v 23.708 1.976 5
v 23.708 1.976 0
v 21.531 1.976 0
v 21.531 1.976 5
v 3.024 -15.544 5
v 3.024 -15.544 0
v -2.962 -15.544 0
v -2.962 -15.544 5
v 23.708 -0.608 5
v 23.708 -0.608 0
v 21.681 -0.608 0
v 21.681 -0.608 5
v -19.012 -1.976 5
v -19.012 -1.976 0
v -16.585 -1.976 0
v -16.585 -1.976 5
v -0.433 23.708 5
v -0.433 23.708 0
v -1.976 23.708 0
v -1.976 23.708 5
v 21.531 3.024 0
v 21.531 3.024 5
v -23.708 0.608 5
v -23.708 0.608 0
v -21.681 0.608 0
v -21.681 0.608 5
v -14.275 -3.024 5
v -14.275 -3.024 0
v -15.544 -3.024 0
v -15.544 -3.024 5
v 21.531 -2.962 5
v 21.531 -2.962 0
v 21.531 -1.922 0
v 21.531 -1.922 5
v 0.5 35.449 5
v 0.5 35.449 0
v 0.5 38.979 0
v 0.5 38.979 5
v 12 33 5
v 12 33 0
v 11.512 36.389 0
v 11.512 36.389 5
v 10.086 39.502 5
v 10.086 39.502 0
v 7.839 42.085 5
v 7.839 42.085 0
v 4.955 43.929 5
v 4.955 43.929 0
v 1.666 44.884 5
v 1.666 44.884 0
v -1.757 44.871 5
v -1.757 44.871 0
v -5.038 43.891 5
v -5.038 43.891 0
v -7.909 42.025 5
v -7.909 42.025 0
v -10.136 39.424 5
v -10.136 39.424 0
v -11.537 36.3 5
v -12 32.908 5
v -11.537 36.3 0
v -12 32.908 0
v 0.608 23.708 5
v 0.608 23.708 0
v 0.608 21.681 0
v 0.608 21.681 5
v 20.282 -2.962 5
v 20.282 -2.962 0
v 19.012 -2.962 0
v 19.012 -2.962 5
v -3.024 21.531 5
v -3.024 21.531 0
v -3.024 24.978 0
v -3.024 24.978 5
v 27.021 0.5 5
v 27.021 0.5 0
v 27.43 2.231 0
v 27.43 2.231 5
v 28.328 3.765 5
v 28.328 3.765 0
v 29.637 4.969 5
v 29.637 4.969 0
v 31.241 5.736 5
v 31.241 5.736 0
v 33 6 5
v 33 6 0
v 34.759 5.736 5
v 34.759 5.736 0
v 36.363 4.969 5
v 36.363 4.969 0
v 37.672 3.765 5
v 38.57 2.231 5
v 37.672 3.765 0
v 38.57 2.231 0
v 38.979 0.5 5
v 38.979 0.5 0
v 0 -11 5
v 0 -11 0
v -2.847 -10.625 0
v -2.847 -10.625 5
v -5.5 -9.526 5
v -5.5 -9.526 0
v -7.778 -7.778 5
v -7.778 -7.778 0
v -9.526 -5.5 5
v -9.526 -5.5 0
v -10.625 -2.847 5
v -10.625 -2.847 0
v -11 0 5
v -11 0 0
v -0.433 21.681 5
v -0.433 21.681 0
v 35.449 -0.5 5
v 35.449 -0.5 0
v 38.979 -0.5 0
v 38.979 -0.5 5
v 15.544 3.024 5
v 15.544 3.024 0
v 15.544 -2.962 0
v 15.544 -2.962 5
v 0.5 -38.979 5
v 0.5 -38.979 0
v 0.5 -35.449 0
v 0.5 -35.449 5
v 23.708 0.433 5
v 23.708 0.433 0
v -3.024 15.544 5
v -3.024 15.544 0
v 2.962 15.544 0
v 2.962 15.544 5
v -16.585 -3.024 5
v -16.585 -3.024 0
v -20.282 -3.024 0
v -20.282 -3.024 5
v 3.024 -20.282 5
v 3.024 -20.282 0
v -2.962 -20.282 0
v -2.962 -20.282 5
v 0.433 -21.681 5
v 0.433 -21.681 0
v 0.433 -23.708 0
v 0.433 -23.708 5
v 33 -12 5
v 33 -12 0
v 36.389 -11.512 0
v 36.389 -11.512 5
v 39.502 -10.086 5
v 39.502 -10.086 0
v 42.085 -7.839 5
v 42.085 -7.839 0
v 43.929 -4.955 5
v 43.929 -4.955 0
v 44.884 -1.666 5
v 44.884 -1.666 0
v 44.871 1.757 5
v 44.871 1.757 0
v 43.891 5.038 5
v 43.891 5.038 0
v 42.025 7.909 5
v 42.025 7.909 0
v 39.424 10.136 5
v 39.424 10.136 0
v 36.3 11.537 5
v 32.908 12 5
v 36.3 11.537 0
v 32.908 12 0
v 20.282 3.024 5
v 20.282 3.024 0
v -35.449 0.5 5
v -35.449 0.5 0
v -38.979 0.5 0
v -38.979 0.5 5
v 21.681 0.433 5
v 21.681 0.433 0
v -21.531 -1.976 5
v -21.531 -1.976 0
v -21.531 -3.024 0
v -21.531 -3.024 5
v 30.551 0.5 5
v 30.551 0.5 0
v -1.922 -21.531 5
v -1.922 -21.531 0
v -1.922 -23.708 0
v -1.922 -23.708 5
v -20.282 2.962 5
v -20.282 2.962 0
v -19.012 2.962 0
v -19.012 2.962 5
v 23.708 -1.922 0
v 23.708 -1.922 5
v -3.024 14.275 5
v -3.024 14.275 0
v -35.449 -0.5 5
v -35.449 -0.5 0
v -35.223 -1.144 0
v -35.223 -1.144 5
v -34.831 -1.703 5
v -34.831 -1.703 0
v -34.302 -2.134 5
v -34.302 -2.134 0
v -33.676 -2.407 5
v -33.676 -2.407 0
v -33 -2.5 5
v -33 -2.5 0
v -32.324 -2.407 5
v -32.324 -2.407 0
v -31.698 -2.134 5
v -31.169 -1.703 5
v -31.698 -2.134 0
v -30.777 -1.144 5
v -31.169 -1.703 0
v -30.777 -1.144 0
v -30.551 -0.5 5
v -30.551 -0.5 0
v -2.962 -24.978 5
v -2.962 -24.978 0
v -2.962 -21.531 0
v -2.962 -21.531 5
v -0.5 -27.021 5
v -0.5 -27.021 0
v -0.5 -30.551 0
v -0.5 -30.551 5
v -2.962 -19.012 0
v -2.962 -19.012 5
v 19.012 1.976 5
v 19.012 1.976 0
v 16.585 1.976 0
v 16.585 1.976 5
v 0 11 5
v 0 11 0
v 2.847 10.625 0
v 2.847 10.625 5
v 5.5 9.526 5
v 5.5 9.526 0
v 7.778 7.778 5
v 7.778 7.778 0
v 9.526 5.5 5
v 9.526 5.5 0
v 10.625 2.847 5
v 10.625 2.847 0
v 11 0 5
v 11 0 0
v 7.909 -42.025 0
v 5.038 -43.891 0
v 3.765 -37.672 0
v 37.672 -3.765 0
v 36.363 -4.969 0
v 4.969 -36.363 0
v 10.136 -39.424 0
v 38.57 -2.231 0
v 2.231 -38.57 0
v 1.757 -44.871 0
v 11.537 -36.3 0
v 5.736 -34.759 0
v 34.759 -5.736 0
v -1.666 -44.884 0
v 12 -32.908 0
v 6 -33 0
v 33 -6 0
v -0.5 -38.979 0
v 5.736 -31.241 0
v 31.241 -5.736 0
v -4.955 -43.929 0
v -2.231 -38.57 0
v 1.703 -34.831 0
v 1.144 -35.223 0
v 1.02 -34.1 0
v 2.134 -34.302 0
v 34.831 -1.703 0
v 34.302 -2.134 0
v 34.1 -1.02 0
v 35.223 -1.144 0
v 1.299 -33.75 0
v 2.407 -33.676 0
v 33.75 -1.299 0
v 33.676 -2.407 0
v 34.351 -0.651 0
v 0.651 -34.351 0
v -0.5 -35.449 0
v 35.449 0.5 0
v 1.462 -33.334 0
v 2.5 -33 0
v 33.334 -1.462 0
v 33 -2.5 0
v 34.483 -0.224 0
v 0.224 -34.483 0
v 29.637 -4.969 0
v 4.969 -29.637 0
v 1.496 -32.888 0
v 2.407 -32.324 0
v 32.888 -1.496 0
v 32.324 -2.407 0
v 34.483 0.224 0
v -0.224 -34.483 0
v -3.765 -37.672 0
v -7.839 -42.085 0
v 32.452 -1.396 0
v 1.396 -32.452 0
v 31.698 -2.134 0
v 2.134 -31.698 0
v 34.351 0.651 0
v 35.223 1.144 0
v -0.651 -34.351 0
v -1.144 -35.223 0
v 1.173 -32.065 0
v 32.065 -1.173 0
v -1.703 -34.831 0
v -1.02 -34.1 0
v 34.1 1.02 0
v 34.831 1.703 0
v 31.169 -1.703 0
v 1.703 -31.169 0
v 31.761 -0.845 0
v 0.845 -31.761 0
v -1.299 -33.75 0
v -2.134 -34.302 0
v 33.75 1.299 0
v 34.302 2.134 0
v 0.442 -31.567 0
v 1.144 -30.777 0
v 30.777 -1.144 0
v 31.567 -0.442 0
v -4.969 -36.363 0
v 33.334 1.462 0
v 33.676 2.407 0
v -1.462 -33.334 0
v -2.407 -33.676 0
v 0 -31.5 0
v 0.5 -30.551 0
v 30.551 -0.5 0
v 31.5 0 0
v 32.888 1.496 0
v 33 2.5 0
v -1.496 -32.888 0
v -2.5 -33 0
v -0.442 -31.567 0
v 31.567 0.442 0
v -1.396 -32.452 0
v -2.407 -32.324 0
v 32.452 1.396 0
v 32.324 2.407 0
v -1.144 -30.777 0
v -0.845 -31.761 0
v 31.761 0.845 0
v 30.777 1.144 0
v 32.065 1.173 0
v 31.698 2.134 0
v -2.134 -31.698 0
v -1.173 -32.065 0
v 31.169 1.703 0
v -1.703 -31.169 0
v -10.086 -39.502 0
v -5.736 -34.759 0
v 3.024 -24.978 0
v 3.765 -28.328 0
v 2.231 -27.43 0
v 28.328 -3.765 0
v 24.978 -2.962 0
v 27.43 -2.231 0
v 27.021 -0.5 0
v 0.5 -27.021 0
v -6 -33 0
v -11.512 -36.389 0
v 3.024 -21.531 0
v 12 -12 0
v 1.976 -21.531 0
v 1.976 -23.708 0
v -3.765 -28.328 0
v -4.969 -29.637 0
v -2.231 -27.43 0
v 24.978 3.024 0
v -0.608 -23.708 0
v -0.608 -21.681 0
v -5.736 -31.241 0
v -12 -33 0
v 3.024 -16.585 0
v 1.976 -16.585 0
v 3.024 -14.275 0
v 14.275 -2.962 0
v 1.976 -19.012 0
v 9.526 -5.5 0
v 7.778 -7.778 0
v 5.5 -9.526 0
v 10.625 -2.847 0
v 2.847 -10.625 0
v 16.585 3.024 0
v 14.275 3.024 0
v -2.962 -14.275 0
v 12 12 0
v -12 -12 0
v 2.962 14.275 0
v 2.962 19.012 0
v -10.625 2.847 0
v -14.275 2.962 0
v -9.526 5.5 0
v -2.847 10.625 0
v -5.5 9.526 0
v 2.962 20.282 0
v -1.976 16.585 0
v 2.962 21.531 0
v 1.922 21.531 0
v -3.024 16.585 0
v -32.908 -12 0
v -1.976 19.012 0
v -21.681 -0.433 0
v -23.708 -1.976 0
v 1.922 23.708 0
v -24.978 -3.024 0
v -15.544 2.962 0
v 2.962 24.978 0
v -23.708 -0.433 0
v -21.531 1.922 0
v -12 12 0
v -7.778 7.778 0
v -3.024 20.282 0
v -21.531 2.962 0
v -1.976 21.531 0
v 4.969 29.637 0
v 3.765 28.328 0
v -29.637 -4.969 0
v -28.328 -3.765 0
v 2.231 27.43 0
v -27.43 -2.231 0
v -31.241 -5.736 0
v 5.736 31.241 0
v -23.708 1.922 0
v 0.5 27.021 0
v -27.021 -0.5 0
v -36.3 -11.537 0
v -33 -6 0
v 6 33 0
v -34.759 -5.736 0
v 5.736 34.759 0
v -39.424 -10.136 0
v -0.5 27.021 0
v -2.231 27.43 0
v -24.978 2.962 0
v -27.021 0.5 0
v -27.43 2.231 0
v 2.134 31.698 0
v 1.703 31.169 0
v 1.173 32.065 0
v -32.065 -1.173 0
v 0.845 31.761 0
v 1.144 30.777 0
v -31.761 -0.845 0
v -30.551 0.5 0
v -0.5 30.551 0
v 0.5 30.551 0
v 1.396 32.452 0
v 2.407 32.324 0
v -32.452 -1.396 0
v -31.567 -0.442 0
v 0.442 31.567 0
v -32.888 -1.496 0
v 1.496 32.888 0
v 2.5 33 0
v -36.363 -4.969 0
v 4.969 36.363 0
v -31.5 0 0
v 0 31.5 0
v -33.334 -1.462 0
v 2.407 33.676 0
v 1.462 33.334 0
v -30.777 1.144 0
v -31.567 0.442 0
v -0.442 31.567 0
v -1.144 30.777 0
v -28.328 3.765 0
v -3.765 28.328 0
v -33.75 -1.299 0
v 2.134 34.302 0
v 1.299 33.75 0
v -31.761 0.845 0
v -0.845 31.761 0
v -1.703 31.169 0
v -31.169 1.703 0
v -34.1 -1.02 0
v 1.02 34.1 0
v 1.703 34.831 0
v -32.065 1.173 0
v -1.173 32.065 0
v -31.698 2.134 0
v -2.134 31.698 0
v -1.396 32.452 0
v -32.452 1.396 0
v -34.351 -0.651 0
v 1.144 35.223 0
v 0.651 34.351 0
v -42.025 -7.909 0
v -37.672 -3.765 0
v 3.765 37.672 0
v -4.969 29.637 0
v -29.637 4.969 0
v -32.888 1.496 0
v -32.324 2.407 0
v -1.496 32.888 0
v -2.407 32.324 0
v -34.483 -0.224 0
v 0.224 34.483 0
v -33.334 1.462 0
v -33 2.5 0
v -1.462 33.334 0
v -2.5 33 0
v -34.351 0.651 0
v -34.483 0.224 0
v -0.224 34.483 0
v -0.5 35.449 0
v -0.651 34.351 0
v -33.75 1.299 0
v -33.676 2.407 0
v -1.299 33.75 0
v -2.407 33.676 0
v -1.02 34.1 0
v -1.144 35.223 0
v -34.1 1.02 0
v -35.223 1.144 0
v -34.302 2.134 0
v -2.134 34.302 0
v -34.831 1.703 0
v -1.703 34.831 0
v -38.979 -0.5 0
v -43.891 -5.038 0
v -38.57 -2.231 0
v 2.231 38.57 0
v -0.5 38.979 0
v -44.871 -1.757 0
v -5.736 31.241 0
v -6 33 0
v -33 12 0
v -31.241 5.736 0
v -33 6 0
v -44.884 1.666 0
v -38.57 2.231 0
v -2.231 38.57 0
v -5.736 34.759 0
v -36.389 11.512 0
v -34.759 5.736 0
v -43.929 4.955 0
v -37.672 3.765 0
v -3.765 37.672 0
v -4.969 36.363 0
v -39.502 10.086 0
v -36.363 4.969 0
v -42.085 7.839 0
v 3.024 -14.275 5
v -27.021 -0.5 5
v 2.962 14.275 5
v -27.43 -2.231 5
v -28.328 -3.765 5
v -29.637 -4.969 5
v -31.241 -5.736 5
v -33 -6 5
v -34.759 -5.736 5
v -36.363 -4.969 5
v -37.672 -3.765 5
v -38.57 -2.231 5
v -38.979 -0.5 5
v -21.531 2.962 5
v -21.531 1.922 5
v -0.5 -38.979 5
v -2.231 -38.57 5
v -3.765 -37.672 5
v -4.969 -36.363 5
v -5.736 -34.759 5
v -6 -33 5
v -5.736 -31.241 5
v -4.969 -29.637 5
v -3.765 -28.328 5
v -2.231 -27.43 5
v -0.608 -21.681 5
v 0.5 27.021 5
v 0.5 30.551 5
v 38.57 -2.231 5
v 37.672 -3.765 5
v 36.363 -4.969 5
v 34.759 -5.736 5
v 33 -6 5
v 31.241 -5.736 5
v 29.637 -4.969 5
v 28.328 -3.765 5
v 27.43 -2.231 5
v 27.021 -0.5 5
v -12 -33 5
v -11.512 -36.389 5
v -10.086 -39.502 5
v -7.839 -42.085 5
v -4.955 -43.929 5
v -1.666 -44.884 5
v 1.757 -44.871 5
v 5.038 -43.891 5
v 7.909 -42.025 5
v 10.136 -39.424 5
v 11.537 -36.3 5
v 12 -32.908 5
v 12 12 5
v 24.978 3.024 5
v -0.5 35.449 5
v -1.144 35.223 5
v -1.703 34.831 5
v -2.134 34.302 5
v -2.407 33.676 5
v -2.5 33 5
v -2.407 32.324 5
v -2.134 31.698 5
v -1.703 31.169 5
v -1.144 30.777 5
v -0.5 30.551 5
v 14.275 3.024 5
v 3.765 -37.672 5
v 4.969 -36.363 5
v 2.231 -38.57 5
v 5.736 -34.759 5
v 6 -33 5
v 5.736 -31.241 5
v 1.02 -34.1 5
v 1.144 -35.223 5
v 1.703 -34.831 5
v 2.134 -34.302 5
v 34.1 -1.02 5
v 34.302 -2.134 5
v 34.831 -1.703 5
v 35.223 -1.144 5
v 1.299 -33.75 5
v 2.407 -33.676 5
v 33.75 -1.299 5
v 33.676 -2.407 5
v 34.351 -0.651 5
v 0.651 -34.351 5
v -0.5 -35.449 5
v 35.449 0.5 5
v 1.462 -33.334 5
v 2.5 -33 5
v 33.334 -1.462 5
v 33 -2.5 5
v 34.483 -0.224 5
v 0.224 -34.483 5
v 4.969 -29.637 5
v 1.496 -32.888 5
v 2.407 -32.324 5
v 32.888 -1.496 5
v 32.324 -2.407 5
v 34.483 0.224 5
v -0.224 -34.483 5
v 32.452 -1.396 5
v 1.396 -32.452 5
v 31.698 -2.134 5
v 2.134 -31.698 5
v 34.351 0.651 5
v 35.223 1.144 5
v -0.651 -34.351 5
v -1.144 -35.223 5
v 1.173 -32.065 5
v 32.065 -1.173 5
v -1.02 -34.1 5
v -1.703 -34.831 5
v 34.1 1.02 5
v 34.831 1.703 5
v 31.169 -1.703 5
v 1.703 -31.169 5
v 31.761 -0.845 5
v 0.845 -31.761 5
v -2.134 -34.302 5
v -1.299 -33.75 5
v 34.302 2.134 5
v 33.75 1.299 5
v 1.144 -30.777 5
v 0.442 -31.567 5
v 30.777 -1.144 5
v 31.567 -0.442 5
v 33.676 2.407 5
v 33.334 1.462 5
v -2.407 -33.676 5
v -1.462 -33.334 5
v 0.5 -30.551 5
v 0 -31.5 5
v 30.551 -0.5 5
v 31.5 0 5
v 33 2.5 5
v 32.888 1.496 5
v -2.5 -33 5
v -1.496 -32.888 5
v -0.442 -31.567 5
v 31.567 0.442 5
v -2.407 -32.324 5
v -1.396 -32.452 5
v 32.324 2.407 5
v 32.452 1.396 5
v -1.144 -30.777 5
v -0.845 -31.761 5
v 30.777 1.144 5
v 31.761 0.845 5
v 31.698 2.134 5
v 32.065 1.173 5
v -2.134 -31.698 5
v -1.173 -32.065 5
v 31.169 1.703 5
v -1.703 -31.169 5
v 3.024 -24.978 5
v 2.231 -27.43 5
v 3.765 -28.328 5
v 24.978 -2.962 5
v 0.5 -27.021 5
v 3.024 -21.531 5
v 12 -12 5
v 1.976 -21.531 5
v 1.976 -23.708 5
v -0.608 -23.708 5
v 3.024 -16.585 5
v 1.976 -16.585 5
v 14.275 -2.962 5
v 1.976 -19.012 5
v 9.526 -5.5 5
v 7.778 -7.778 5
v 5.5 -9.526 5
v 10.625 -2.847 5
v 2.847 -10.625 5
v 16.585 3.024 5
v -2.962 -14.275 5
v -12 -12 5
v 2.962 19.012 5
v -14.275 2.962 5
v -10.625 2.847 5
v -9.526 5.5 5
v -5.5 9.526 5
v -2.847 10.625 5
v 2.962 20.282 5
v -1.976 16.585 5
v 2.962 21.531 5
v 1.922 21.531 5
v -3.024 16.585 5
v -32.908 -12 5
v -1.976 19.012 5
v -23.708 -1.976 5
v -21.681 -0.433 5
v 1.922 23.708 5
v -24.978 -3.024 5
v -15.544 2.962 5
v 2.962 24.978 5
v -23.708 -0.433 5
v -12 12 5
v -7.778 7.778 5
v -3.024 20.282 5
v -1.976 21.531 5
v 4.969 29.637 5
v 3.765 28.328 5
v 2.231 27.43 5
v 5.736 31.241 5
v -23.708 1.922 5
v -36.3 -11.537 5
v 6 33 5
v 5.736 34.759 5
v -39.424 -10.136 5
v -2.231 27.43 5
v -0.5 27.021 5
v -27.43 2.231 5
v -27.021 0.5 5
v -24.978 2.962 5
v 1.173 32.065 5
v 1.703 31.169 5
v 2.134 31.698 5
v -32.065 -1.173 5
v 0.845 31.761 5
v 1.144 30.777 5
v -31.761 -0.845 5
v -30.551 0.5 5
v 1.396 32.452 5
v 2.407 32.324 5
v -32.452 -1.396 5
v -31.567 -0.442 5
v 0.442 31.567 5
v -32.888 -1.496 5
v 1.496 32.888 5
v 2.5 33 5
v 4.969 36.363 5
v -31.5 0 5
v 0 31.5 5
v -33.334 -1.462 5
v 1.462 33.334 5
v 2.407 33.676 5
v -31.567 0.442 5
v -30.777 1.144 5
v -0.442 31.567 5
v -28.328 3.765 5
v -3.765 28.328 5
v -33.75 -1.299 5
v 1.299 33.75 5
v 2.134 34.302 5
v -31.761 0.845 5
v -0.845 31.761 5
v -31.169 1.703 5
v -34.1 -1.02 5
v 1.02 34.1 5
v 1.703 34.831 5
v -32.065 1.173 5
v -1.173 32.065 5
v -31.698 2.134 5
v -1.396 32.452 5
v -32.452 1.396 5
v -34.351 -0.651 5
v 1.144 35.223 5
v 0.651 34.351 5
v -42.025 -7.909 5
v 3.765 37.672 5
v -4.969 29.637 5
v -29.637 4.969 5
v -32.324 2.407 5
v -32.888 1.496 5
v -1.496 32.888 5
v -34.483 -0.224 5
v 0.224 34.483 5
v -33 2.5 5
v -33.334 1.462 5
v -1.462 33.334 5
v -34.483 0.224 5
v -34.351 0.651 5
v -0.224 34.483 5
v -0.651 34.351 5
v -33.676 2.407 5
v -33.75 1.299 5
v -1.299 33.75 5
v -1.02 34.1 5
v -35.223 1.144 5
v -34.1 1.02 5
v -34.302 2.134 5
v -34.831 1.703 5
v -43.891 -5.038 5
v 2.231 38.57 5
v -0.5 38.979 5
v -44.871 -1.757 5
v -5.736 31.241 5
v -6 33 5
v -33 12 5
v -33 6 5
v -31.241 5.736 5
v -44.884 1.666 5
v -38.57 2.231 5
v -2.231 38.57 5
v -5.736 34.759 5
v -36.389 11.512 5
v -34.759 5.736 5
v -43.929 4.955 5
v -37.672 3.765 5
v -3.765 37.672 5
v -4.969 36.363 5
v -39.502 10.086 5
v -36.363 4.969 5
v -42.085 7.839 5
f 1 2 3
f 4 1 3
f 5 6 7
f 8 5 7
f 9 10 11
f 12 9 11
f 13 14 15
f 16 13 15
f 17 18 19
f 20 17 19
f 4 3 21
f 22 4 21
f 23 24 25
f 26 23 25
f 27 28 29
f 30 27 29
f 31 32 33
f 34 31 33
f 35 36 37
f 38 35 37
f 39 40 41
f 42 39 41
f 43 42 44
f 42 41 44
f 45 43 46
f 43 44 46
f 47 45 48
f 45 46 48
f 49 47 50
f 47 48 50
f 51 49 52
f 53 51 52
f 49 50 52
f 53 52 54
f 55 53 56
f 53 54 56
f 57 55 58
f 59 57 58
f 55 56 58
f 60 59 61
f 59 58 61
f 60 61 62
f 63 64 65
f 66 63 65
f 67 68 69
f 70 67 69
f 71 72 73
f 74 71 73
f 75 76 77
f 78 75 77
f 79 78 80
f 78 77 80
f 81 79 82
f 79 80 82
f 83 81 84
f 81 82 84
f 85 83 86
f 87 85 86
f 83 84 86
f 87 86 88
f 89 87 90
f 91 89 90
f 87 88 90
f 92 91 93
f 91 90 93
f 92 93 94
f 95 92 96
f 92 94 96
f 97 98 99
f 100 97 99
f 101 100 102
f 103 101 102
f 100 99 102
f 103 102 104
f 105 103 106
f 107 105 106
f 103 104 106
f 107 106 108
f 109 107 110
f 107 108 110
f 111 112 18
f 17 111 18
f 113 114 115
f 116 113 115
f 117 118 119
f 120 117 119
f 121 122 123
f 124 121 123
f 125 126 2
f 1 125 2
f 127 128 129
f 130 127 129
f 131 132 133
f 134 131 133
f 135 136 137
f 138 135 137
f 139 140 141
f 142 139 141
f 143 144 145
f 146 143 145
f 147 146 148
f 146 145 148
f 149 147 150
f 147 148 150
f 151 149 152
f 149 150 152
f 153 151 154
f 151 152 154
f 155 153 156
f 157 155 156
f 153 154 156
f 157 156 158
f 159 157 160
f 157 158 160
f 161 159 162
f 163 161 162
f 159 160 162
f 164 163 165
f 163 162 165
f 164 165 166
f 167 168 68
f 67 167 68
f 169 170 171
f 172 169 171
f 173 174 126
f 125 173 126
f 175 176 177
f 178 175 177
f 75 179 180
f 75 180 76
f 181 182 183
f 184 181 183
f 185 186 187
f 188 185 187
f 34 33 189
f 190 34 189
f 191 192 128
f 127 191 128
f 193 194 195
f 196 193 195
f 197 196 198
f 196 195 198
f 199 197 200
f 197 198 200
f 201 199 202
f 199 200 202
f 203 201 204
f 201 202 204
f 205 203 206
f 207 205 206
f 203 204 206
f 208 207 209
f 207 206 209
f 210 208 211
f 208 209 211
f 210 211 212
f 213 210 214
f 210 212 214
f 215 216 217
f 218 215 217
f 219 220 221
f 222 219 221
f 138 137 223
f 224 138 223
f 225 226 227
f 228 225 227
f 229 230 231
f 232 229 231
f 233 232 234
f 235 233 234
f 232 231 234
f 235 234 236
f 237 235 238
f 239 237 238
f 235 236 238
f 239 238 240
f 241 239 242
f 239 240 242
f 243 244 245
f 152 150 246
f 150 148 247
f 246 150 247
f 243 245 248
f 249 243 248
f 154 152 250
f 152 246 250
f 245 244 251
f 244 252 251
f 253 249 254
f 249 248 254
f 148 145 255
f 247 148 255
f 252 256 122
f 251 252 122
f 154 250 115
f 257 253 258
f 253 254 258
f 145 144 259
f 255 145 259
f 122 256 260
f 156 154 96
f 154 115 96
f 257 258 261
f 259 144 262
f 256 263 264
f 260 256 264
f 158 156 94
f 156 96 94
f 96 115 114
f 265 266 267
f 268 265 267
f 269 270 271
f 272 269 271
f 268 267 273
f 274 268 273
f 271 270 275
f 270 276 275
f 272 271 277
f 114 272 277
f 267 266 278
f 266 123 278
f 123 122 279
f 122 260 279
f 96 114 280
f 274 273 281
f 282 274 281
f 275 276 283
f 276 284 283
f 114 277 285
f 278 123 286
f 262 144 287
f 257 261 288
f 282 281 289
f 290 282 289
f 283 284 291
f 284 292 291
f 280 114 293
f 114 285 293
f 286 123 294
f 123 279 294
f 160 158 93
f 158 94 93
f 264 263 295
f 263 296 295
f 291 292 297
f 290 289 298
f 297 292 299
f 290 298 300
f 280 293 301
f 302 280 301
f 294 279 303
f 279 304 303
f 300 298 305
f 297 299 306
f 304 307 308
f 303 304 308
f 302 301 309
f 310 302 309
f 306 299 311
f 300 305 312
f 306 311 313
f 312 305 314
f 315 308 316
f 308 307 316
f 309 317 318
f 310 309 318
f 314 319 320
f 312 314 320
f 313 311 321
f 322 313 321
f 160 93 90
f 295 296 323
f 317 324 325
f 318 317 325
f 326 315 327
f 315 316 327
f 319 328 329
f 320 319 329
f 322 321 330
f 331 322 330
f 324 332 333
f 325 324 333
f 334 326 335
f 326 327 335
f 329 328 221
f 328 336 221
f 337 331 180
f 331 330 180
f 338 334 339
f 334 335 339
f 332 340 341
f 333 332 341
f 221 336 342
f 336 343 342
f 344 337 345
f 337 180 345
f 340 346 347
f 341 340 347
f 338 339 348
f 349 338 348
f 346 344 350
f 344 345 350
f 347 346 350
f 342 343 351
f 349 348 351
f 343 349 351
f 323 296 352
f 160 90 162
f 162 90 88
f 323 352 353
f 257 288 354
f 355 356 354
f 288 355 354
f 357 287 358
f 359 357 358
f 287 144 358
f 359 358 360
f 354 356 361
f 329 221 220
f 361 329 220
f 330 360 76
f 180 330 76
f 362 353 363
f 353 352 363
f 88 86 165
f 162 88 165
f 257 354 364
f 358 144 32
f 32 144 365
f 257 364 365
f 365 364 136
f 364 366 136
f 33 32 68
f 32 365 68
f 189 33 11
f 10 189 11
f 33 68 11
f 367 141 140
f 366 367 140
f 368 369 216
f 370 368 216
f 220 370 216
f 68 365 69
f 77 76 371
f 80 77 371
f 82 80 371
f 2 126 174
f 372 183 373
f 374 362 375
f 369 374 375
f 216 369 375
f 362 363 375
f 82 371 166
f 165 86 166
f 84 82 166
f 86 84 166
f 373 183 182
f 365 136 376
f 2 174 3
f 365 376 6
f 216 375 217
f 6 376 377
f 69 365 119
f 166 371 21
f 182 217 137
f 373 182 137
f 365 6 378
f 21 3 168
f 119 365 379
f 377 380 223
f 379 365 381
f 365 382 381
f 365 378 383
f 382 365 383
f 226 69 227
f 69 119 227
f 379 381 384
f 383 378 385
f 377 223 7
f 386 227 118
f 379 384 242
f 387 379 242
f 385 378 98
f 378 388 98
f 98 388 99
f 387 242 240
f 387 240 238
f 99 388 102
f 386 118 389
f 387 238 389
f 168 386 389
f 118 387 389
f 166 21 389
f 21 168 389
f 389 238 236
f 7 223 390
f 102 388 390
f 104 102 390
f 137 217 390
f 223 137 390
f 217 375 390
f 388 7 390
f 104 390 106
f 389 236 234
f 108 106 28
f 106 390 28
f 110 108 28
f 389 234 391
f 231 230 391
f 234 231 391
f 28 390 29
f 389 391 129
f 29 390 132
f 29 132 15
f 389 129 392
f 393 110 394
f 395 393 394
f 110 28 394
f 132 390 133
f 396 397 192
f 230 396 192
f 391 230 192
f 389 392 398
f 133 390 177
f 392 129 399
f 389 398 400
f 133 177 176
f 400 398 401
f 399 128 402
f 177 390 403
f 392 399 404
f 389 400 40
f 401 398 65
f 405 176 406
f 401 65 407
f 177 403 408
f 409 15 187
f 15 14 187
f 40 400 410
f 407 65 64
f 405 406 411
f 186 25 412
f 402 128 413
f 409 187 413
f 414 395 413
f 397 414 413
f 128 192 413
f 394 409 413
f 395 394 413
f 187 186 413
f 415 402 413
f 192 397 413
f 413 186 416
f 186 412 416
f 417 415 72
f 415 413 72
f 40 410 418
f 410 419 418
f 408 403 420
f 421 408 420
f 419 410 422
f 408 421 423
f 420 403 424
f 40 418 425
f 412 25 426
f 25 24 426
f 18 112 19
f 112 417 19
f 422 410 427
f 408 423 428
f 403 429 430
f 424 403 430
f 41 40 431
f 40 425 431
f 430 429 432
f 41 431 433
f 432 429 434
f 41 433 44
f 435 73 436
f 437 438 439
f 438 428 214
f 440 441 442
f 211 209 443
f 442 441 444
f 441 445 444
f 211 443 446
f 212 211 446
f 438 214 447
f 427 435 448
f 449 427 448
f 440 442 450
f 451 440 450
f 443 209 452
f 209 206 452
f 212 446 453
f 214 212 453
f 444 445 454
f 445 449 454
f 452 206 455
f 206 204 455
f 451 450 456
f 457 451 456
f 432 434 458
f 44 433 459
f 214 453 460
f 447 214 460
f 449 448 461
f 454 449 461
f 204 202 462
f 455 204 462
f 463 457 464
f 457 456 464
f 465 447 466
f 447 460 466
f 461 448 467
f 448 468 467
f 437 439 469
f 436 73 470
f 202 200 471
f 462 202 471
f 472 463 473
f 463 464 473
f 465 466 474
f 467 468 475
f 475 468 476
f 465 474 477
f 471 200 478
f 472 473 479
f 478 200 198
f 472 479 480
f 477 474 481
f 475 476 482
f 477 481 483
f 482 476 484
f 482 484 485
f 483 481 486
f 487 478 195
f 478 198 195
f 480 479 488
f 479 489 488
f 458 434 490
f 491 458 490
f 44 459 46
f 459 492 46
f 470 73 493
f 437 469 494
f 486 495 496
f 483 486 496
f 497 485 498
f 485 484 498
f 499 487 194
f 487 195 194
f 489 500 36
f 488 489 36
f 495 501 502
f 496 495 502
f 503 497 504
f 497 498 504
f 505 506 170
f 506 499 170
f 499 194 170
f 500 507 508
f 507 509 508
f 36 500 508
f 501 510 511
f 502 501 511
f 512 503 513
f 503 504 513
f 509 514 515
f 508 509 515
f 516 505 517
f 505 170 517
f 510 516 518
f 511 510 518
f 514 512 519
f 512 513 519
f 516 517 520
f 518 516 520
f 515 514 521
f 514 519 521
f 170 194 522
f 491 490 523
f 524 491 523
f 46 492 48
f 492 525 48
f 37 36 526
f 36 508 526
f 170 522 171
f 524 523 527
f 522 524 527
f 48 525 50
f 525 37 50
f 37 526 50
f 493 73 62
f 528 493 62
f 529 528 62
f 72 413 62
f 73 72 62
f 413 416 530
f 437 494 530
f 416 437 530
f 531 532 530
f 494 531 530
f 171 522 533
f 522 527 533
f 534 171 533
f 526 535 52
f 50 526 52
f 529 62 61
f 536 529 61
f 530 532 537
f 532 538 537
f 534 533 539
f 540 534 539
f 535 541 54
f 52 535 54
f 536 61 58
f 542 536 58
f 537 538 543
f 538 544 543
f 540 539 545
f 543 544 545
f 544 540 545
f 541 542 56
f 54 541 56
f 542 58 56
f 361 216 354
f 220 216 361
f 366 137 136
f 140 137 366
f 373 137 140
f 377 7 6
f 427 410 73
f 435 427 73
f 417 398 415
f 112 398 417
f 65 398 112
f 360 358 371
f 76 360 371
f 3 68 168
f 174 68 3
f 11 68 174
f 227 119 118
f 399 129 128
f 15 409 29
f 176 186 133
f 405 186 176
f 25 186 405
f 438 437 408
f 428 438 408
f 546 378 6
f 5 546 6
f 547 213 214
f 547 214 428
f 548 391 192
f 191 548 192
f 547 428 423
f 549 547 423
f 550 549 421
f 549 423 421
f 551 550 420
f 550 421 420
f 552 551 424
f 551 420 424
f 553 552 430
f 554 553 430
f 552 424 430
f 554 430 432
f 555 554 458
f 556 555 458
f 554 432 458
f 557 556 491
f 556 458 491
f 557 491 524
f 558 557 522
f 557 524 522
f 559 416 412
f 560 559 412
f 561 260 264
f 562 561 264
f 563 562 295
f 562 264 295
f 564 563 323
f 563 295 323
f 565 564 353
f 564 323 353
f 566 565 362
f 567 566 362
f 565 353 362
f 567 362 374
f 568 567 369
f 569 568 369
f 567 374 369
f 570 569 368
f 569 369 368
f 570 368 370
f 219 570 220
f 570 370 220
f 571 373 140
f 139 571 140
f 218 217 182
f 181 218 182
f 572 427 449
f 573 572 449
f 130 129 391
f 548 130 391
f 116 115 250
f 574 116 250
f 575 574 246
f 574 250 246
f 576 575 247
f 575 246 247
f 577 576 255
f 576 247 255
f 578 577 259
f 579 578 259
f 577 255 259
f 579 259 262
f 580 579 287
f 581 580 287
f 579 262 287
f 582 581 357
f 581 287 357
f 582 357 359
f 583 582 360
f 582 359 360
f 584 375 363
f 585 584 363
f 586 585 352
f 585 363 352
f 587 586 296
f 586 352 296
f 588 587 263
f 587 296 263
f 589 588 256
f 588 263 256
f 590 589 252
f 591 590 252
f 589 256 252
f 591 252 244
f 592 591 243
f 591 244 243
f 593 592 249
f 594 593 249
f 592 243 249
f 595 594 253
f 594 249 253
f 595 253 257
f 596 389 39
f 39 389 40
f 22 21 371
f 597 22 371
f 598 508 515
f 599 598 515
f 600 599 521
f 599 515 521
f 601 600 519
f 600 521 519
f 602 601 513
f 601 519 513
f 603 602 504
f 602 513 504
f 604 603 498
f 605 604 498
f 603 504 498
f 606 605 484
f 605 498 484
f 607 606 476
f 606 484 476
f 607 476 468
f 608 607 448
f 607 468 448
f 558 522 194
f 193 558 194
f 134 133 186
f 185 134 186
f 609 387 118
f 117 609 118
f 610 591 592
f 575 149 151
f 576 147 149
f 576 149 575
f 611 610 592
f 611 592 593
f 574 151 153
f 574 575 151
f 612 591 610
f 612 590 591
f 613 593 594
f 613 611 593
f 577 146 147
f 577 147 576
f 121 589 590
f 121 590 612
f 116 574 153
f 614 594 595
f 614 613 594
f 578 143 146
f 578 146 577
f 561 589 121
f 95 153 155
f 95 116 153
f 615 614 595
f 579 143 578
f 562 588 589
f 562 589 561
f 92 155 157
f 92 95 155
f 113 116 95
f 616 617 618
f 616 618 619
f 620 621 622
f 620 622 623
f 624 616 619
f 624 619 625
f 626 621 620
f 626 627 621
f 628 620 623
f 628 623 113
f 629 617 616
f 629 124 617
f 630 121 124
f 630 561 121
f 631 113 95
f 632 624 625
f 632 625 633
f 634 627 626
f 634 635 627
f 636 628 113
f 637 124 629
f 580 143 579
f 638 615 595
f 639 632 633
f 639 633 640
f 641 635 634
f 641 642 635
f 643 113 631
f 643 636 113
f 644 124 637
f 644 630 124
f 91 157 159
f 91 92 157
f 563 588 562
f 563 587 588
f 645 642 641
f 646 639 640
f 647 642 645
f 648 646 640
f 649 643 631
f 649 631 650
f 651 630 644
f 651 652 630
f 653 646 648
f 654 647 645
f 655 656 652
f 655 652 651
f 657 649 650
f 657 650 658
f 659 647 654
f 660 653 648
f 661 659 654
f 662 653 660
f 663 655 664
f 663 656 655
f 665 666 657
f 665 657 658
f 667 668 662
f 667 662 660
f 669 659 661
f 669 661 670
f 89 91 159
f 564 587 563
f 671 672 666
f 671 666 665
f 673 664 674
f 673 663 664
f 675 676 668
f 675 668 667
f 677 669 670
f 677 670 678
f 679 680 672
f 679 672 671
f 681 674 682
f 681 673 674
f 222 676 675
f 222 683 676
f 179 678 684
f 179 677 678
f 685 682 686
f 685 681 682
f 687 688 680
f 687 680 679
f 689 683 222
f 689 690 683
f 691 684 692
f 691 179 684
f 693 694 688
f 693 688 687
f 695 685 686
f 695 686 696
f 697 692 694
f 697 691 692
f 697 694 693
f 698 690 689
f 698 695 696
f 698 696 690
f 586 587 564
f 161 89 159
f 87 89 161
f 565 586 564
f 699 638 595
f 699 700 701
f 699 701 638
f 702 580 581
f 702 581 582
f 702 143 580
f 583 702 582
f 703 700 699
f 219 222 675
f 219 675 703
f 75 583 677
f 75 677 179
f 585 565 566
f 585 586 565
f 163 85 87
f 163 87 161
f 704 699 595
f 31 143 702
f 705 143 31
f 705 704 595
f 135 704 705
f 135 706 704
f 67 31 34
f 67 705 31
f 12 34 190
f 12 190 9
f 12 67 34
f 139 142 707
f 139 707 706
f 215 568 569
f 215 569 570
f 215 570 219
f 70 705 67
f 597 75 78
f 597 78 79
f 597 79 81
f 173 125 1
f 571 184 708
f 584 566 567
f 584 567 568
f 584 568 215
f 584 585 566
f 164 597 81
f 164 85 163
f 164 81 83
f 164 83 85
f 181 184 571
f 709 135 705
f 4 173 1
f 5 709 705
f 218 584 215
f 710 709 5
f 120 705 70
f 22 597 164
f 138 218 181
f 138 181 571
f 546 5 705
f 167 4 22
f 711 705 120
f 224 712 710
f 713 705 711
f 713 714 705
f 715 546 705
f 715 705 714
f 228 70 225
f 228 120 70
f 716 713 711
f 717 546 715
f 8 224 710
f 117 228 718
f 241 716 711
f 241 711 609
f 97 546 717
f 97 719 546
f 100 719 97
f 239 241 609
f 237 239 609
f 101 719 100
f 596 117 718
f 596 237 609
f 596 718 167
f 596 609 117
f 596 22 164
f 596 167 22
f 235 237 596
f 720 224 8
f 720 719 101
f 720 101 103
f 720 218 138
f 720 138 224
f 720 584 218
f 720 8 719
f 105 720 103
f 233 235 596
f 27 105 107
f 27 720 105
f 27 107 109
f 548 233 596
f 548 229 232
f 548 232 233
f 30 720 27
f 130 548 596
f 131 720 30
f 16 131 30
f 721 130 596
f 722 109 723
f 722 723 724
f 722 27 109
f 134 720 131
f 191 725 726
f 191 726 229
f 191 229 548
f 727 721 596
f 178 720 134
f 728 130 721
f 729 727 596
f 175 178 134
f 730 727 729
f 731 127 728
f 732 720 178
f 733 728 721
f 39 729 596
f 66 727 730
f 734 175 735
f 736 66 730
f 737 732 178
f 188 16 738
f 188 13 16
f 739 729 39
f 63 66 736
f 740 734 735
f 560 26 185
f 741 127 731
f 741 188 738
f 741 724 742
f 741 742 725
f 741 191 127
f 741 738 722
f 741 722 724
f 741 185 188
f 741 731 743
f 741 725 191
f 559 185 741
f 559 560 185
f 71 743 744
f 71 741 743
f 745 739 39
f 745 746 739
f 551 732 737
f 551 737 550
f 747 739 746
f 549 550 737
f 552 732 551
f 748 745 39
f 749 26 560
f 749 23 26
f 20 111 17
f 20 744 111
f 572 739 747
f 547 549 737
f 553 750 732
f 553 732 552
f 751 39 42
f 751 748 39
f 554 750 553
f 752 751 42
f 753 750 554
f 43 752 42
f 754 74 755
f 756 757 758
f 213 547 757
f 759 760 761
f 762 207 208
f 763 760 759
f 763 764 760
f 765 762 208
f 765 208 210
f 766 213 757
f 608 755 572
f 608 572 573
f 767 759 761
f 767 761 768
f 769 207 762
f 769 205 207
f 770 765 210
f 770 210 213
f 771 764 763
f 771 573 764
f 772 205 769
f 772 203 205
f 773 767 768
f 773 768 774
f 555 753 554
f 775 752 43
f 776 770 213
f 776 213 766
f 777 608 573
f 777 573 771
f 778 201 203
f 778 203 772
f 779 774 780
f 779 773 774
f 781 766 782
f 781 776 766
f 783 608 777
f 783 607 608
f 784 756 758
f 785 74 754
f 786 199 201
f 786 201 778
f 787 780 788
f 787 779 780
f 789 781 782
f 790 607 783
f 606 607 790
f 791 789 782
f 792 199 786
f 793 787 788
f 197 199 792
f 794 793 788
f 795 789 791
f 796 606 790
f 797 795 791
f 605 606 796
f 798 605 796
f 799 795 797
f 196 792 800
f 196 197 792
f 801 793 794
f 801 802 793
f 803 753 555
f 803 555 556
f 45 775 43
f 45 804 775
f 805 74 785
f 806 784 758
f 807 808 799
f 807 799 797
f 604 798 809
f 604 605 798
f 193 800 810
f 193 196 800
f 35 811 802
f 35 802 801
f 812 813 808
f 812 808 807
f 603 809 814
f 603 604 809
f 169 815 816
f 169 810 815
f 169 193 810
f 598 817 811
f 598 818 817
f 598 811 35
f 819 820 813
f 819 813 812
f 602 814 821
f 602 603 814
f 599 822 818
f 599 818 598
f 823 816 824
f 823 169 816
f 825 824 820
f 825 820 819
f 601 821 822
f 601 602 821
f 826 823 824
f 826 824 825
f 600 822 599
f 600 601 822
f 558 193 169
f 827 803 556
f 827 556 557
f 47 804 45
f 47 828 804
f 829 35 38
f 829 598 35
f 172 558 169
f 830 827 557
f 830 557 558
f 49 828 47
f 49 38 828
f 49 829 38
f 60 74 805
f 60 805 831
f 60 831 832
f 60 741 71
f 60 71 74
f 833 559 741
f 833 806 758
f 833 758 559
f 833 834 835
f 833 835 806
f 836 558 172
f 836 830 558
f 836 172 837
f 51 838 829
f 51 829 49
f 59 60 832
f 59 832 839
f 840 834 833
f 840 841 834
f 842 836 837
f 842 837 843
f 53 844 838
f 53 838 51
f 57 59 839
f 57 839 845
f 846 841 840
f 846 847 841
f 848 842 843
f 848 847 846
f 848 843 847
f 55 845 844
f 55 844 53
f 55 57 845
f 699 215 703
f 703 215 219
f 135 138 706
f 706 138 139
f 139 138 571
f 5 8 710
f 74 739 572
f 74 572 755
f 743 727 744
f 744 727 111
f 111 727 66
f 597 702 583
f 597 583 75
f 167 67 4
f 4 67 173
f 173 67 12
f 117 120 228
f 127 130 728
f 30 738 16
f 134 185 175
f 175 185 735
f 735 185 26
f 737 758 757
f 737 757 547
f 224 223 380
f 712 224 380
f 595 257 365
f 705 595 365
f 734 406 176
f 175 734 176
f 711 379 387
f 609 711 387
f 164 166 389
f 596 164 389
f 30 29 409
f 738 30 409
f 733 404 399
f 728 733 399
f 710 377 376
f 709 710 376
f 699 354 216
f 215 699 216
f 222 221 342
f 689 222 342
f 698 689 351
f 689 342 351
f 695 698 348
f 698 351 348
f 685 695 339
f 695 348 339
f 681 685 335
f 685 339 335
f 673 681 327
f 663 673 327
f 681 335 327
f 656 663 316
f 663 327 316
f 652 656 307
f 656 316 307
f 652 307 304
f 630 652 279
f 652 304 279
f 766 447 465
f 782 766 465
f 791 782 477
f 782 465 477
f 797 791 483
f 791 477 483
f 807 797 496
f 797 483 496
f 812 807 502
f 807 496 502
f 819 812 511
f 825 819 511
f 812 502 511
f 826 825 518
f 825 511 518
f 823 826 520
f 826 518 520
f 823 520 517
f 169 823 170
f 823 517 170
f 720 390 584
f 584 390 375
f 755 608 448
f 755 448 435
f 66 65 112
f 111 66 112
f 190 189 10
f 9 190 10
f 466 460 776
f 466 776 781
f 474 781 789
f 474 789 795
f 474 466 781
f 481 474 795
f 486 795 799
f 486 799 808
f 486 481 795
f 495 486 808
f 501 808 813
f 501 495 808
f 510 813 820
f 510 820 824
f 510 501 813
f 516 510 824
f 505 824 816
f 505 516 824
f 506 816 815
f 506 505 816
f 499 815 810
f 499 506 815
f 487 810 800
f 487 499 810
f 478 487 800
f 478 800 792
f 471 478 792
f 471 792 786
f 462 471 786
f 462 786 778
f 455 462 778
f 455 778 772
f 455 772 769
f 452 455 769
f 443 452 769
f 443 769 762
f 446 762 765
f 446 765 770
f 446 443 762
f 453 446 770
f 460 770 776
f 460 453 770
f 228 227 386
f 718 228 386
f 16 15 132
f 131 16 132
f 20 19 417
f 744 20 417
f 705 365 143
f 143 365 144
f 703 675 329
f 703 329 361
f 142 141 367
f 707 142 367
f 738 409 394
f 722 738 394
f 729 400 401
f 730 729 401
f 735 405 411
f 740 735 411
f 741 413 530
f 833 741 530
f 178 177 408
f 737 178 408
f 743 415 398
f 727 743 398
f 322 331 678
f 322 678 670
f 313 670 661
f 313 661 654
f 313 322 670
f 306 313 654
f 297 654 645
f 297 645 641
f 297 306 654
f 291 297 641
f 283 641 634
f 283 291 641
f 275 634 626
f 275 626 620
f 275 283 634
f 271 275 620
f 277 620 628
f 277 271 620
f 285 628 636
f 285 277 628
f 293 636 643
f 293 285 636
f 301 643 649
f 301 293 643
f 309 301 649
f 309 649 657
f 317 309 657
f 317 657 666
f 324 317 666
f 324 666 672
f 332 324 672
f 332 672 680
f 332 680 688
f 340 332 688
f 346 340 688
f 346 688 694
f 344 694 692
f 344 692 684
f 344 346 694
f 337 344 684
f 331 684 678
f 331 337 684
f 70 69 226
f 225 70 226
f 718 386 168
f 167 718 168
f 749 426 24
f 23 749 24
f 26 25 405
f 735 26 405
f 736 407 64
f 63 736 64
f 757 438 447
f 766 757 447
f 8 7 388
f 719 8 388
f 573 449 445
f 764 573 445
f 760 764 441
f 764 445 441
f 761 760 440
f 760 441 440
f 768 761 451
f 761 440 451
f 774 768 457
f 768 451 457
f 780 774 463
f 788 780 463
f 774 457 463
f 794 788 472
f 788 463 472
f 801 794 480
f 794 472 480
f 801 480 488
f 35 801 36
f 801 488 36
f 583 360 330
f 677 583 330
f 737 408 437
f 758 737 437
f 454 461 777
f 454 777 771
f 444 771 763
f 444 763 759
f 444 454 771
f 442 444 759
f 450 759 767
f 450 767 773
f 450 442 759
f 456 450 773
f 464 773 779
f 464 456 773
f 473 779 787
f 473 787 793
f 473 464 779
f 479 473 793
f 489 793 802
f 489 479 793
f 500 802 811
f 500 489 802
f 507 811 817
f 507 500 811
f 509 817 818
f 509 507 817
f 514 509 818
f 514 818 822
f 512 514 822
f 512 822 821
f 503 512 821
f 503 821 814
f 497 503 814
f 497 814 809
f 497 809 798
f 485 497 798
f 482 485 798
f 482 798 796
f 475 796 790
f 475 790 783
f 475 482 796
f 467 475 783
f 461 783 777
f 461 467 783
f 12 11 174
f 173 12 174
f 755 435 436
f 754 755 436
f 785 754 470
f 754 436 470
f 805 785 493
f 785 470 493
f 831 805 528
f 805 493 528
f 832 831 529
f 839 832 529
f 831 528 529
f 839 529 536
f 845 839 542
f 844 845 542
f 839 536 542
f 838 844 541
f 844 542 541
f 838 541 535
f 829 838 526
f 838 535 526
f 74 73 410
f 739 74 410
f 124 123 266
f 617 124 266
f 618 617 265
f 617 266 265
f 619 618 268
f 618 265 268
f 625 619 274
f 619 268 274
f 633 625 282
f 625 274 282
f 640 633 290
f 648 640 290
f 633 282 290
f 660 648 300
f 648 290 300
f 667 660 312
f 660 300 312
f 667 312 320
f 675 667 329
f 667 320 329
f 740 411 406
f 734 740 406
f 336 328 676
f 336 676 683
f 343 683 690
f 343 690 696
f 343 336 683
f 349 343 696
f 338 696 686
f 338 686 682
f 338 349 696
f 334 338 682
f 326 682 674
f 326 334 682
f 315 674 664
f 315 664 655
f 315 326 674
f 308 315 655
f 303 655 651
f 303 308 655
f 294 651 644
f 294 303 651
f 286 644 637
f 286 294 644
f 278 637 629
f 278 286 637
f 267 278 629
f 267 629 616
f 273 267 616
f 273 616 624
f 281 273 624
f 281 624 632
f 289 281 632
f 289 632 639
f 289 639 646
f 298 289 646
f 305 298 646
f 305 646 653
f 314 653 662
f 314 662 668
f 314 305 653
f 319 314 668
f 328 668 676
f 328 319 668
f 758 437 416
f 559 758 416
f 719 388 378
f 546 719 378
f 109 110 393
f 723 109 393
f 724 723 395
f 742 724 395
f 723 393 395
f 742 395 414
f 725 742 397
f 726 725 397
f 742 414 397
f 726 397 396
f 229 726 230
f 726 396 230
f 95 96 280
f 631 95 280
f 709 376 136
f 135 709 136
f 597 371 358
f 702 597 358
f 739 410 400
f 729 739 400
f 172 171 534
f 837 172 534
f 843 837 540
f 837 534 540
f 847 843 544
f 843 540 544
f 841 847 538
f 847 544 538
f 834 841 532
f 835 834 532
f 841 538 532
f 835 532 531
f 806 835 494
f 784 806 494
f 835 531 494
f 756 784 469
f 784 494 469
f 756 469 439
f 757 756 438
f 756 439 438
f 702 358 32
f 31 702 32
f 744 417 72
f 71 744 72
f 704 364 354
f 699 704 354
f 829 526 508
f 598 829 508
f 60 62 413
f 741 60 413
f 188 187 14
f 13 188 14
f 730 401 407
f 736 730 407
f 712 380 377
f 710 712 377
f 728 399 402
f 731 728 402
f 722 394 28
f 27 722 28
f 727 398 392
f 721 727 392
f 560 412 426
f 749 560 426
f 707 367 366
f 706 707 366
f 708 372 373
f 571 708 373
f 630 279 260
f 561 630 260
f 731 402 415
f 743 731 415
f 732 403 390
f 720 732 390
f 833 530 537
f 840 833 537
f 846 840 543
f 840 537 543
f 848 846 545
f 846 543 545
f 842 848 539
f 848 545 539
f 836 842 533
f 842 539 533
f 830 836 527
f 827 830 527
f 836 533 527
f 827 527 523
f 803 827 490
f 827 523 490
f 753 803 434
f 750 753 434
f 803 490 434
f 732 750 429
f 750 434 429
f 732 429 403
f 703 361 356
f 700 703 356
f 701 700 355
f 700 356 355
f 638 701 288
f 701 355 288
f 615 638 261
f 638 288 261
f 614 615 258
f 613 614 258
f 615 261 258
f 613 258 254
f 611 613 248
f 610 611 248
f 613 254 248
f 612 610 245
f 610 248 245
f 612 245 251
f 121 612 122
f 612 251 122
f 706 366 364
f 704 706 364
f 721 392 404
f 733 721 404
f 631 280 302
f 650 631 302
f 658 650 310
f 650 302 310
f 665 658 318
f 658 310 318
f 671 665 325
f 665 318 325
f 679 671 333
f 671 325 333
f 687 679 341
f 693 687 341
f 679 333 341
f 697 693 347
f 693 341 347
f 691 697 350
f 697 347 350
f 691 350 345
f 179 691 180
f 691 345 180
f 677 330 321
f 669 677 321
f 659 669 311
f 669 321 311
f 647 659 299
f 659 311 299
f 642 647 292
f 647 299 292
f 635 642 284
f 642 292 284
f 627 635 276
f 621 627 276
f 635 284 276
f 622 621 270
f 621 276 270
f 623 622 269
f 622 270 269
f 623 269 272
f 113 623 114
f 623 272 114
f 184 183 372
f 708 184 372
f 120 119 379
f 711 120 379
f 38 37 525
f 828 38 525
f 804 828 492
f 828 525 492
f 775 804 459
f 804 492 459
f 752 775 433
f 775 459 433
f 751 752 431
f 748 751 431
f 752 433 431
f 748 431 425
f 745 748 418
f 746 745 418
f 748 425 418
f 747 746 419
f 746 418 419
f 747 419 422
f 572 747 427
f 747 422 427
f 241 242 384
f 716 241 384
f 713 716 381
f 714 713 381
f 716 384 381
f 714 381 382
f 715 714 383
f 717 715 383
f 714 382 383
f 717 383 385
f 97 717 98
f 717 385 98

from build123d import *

# Parameters (mm, degrees)
F0_R     = 1.5
F1_DEPTH = 5
F2_COUNT = 4


with BuildPart() as f1:
    # F0 (on Top) → F1 (new body)
    with BuildSketch(Plane.XY):
        with BuildLine():
            ThreePointArc((-21, 0), (-24.5147186258, 8.4852813742), (-33, 12))
            ThreePointArc((-33, 12), (-44.9999119071, -0.0459806707), (-32.9080393338, -11.9996476297))
            ThreePointArc((-32.9080393338, -11.9996476297), (-24.4822676728, -8.4527058391), (-21, 0))
        make_face()
        Polygon((-21.6812912544, 0.6075373587), (-21.6812912544, 0), (-21.6812912544, -0.4327508824), (-23.7081500818, -0.4327508824), (-23.7081500818, -1.9761508169), (-21.5306197837, -1.9761508169), (-21.5306197837, -3.0243001782), (-24.9777209956, -3.0243001782), (-24.9777209956, 0), (-24.9777209956, 2.9619428615), (-21.5306197837, 2.9619428615), (-21.5306197837, 1.9216546204), (-23.7081500818, 1.9216546204), (-23.7081500818, 0.6075373587), align=None, mode=Mode.SUBTRACT)
        with BuildLine():
            ThreePointArc((-27.0208696284, 0.5), (-27.0052196775, 0.2502176759), (-27, 0))
            ThreePointArc((-27, 0), (-27.0052196775, -0.2502176759), (-27.0208696284, -0.5))
            ThreePointArc((-27.0208696284, -0.5), (-33, -6), (-38.9791303716, -0.5))
            ThreePointArc((-38.9791303716, -0.5), (-39, 0), (-38.9791303716, 0.5))
            ThreePointArc((-38.9791303716, 0.5), (-33, 6), (-27.0208696284, 0.5))
        make_face(mode=Mode.SUBTRACT)
        with BuildLine():
            ThreePointArc((-11, 0), (-7.7781745931, 7.7781745931), (0, 11))
            Line((0, 11), (0, 12))
            Line((0, 12), (-33, 12))
            ThreePointArc((-33, 12), (-24.5147186258, 8.4852813742), (-21, 0))
            Line((-21, 0), (-20.2820118571, 0))
            Line((-20.2820118571, 0), (-20.2820118571, 2.9619428615))
            Line((-20.2820118571, 2.9619428615), (-19.0124409432, 2.9619428615))
            Line((-19.0124409432, 2.9619428615), (-19.0124409432, 0))
            Line((-19.0124409432, 0), (-15.5443767441, 0))
            Line((-15.5443767441, 0), (-15.5443767441, 2.9619428615))
            Line((-15.5443767441, 2.9619428615), (-14.2748058302, 2.9619428615))
            Line((-14.2748058302, 2.9619428615), (-14.2748058302, 0))
            Line((-14.2748058302, 0), (-11, 0))
        make_face()
        with BuildLine():
            Line((0, -11.9996476297), (0, -11))
            ThreePointArc((0, -11), (-7.7781745931, -7.7781745931), (-11, 0))
            Line((-11, 0), (-14.2748058302, 0))
            Line((-14.2748058302, 0), (-14.2748058302, -3.0243001782))
            Line((-14.2748058302, -3.0243001782), (-15.5443767441, -3.0243001782))
            Line((-15.5443767441, -3.0243001782), (-15.5443767441, 0))
            Line((-15.5443767441, 0), (-19.0124409432, 0))
            Line((-19.0124409432, 0), (-19.0124409432, -1.9761508169))
            Line((-19.0124409432, -1.9761508169), (-16.5846649851, -1.9761508169))
            Line((-16.5846649851, -1.9761508169), (-16.5846649851, -3.0243001782))
            Line((-16.5846649851, -3.0243001782), (-20.2820118571, -3.0243001782))
            Line((-20.2820118571, -3.0243001782), (-20.2820118571, 0))
            Line((-20.2820118571, 0), (-21, 0))
            ThreePointArc((-21, 0), (-24.4822676728, -8.4527058391), (-32.9080393338, -11.9996476297))
            Line((-32.9080393338, -11.9996476297), (0, -11.9996476297))
        make_face()
        with BuildLine():
            ThreePointArc((-30.5505102572, -0.5), (-30.5126596175, -0.251272405), (-30.5, 0))
            ThreePointArc((-30.5, 0), (-30.5126596175, 0.251272405), (-30.5505102572, 0.5))
            ThreePointArc((-30.5505102572, 0.5), (-33, 2.5), (-35.4494897428, 0.5))
            ThreePointArc((-35.4494897428, 0.5), (-35.5, 0), (-35.4494897428, -0.5))
            ThreePointArc((-35.4494897428, -0.5), (-33, -2.5), (-30.5505102572, -0.5))
        make_face()
        with Locations((-33, 0)):
            Circle(F0_R, mode=Mode.SUBTRACT)
        with BuildLine():
            Line((-35.4494897428, 0.5), (-38.9791303716, 0.5))
            ThreePointArc((-38.9791303716, 0.5), (-39, 0), (-38.9791303716, -0.5))
            Line((-38.9791303716, -0.5), (-35.4494897428, -0.5))
            ThreePointArc((-35.4494897428, -0.5), (-35.5, 0), (-35.4494897428, 0.5))
        make_face()
        with BuildLine():
            ThreePointArc((-27.0208696284, -0.5), (-27.0052196775, -0.2502176759), (-27, 0))
            Line((-27, 0), (-30.5, 0))
            ThreePointArc((-30.5, 0), (-30.5126596175, -0.251272405), (-30.5505102572, -0.5))
            Line((-30.5505102572, -0.5), (-27.0208696284, -0.5))
        make_face()
        with BuildLine():
            Line((-30.5, 0), (-27, 0))
            ThreePointArc((-27, 0), (-27.0052196775, 0.2502176759), (-27.0208696284, 0.5))
            Line((-27.0208696284, 0.5), (-30.5505102572, 0.5))
            ThreePointArc((-30.5505102572, 0.5), (-30.5126596175, 0.251272405), (-30.5, 0))
        make_face()
    extrude(amount=F1_DEPTH)

    # F2: F1 ×4 about axis
    f2_axis = Axis((0, 0, 5), (0, 0, -1))


with BuildPart() as f1_1:
    add(f1.part)
    for i in range(1, F2_COUNT):
        add(f1.part.rotate(f2_axis, i * 360 / F2_COUNT))


solid = f1_1.part
